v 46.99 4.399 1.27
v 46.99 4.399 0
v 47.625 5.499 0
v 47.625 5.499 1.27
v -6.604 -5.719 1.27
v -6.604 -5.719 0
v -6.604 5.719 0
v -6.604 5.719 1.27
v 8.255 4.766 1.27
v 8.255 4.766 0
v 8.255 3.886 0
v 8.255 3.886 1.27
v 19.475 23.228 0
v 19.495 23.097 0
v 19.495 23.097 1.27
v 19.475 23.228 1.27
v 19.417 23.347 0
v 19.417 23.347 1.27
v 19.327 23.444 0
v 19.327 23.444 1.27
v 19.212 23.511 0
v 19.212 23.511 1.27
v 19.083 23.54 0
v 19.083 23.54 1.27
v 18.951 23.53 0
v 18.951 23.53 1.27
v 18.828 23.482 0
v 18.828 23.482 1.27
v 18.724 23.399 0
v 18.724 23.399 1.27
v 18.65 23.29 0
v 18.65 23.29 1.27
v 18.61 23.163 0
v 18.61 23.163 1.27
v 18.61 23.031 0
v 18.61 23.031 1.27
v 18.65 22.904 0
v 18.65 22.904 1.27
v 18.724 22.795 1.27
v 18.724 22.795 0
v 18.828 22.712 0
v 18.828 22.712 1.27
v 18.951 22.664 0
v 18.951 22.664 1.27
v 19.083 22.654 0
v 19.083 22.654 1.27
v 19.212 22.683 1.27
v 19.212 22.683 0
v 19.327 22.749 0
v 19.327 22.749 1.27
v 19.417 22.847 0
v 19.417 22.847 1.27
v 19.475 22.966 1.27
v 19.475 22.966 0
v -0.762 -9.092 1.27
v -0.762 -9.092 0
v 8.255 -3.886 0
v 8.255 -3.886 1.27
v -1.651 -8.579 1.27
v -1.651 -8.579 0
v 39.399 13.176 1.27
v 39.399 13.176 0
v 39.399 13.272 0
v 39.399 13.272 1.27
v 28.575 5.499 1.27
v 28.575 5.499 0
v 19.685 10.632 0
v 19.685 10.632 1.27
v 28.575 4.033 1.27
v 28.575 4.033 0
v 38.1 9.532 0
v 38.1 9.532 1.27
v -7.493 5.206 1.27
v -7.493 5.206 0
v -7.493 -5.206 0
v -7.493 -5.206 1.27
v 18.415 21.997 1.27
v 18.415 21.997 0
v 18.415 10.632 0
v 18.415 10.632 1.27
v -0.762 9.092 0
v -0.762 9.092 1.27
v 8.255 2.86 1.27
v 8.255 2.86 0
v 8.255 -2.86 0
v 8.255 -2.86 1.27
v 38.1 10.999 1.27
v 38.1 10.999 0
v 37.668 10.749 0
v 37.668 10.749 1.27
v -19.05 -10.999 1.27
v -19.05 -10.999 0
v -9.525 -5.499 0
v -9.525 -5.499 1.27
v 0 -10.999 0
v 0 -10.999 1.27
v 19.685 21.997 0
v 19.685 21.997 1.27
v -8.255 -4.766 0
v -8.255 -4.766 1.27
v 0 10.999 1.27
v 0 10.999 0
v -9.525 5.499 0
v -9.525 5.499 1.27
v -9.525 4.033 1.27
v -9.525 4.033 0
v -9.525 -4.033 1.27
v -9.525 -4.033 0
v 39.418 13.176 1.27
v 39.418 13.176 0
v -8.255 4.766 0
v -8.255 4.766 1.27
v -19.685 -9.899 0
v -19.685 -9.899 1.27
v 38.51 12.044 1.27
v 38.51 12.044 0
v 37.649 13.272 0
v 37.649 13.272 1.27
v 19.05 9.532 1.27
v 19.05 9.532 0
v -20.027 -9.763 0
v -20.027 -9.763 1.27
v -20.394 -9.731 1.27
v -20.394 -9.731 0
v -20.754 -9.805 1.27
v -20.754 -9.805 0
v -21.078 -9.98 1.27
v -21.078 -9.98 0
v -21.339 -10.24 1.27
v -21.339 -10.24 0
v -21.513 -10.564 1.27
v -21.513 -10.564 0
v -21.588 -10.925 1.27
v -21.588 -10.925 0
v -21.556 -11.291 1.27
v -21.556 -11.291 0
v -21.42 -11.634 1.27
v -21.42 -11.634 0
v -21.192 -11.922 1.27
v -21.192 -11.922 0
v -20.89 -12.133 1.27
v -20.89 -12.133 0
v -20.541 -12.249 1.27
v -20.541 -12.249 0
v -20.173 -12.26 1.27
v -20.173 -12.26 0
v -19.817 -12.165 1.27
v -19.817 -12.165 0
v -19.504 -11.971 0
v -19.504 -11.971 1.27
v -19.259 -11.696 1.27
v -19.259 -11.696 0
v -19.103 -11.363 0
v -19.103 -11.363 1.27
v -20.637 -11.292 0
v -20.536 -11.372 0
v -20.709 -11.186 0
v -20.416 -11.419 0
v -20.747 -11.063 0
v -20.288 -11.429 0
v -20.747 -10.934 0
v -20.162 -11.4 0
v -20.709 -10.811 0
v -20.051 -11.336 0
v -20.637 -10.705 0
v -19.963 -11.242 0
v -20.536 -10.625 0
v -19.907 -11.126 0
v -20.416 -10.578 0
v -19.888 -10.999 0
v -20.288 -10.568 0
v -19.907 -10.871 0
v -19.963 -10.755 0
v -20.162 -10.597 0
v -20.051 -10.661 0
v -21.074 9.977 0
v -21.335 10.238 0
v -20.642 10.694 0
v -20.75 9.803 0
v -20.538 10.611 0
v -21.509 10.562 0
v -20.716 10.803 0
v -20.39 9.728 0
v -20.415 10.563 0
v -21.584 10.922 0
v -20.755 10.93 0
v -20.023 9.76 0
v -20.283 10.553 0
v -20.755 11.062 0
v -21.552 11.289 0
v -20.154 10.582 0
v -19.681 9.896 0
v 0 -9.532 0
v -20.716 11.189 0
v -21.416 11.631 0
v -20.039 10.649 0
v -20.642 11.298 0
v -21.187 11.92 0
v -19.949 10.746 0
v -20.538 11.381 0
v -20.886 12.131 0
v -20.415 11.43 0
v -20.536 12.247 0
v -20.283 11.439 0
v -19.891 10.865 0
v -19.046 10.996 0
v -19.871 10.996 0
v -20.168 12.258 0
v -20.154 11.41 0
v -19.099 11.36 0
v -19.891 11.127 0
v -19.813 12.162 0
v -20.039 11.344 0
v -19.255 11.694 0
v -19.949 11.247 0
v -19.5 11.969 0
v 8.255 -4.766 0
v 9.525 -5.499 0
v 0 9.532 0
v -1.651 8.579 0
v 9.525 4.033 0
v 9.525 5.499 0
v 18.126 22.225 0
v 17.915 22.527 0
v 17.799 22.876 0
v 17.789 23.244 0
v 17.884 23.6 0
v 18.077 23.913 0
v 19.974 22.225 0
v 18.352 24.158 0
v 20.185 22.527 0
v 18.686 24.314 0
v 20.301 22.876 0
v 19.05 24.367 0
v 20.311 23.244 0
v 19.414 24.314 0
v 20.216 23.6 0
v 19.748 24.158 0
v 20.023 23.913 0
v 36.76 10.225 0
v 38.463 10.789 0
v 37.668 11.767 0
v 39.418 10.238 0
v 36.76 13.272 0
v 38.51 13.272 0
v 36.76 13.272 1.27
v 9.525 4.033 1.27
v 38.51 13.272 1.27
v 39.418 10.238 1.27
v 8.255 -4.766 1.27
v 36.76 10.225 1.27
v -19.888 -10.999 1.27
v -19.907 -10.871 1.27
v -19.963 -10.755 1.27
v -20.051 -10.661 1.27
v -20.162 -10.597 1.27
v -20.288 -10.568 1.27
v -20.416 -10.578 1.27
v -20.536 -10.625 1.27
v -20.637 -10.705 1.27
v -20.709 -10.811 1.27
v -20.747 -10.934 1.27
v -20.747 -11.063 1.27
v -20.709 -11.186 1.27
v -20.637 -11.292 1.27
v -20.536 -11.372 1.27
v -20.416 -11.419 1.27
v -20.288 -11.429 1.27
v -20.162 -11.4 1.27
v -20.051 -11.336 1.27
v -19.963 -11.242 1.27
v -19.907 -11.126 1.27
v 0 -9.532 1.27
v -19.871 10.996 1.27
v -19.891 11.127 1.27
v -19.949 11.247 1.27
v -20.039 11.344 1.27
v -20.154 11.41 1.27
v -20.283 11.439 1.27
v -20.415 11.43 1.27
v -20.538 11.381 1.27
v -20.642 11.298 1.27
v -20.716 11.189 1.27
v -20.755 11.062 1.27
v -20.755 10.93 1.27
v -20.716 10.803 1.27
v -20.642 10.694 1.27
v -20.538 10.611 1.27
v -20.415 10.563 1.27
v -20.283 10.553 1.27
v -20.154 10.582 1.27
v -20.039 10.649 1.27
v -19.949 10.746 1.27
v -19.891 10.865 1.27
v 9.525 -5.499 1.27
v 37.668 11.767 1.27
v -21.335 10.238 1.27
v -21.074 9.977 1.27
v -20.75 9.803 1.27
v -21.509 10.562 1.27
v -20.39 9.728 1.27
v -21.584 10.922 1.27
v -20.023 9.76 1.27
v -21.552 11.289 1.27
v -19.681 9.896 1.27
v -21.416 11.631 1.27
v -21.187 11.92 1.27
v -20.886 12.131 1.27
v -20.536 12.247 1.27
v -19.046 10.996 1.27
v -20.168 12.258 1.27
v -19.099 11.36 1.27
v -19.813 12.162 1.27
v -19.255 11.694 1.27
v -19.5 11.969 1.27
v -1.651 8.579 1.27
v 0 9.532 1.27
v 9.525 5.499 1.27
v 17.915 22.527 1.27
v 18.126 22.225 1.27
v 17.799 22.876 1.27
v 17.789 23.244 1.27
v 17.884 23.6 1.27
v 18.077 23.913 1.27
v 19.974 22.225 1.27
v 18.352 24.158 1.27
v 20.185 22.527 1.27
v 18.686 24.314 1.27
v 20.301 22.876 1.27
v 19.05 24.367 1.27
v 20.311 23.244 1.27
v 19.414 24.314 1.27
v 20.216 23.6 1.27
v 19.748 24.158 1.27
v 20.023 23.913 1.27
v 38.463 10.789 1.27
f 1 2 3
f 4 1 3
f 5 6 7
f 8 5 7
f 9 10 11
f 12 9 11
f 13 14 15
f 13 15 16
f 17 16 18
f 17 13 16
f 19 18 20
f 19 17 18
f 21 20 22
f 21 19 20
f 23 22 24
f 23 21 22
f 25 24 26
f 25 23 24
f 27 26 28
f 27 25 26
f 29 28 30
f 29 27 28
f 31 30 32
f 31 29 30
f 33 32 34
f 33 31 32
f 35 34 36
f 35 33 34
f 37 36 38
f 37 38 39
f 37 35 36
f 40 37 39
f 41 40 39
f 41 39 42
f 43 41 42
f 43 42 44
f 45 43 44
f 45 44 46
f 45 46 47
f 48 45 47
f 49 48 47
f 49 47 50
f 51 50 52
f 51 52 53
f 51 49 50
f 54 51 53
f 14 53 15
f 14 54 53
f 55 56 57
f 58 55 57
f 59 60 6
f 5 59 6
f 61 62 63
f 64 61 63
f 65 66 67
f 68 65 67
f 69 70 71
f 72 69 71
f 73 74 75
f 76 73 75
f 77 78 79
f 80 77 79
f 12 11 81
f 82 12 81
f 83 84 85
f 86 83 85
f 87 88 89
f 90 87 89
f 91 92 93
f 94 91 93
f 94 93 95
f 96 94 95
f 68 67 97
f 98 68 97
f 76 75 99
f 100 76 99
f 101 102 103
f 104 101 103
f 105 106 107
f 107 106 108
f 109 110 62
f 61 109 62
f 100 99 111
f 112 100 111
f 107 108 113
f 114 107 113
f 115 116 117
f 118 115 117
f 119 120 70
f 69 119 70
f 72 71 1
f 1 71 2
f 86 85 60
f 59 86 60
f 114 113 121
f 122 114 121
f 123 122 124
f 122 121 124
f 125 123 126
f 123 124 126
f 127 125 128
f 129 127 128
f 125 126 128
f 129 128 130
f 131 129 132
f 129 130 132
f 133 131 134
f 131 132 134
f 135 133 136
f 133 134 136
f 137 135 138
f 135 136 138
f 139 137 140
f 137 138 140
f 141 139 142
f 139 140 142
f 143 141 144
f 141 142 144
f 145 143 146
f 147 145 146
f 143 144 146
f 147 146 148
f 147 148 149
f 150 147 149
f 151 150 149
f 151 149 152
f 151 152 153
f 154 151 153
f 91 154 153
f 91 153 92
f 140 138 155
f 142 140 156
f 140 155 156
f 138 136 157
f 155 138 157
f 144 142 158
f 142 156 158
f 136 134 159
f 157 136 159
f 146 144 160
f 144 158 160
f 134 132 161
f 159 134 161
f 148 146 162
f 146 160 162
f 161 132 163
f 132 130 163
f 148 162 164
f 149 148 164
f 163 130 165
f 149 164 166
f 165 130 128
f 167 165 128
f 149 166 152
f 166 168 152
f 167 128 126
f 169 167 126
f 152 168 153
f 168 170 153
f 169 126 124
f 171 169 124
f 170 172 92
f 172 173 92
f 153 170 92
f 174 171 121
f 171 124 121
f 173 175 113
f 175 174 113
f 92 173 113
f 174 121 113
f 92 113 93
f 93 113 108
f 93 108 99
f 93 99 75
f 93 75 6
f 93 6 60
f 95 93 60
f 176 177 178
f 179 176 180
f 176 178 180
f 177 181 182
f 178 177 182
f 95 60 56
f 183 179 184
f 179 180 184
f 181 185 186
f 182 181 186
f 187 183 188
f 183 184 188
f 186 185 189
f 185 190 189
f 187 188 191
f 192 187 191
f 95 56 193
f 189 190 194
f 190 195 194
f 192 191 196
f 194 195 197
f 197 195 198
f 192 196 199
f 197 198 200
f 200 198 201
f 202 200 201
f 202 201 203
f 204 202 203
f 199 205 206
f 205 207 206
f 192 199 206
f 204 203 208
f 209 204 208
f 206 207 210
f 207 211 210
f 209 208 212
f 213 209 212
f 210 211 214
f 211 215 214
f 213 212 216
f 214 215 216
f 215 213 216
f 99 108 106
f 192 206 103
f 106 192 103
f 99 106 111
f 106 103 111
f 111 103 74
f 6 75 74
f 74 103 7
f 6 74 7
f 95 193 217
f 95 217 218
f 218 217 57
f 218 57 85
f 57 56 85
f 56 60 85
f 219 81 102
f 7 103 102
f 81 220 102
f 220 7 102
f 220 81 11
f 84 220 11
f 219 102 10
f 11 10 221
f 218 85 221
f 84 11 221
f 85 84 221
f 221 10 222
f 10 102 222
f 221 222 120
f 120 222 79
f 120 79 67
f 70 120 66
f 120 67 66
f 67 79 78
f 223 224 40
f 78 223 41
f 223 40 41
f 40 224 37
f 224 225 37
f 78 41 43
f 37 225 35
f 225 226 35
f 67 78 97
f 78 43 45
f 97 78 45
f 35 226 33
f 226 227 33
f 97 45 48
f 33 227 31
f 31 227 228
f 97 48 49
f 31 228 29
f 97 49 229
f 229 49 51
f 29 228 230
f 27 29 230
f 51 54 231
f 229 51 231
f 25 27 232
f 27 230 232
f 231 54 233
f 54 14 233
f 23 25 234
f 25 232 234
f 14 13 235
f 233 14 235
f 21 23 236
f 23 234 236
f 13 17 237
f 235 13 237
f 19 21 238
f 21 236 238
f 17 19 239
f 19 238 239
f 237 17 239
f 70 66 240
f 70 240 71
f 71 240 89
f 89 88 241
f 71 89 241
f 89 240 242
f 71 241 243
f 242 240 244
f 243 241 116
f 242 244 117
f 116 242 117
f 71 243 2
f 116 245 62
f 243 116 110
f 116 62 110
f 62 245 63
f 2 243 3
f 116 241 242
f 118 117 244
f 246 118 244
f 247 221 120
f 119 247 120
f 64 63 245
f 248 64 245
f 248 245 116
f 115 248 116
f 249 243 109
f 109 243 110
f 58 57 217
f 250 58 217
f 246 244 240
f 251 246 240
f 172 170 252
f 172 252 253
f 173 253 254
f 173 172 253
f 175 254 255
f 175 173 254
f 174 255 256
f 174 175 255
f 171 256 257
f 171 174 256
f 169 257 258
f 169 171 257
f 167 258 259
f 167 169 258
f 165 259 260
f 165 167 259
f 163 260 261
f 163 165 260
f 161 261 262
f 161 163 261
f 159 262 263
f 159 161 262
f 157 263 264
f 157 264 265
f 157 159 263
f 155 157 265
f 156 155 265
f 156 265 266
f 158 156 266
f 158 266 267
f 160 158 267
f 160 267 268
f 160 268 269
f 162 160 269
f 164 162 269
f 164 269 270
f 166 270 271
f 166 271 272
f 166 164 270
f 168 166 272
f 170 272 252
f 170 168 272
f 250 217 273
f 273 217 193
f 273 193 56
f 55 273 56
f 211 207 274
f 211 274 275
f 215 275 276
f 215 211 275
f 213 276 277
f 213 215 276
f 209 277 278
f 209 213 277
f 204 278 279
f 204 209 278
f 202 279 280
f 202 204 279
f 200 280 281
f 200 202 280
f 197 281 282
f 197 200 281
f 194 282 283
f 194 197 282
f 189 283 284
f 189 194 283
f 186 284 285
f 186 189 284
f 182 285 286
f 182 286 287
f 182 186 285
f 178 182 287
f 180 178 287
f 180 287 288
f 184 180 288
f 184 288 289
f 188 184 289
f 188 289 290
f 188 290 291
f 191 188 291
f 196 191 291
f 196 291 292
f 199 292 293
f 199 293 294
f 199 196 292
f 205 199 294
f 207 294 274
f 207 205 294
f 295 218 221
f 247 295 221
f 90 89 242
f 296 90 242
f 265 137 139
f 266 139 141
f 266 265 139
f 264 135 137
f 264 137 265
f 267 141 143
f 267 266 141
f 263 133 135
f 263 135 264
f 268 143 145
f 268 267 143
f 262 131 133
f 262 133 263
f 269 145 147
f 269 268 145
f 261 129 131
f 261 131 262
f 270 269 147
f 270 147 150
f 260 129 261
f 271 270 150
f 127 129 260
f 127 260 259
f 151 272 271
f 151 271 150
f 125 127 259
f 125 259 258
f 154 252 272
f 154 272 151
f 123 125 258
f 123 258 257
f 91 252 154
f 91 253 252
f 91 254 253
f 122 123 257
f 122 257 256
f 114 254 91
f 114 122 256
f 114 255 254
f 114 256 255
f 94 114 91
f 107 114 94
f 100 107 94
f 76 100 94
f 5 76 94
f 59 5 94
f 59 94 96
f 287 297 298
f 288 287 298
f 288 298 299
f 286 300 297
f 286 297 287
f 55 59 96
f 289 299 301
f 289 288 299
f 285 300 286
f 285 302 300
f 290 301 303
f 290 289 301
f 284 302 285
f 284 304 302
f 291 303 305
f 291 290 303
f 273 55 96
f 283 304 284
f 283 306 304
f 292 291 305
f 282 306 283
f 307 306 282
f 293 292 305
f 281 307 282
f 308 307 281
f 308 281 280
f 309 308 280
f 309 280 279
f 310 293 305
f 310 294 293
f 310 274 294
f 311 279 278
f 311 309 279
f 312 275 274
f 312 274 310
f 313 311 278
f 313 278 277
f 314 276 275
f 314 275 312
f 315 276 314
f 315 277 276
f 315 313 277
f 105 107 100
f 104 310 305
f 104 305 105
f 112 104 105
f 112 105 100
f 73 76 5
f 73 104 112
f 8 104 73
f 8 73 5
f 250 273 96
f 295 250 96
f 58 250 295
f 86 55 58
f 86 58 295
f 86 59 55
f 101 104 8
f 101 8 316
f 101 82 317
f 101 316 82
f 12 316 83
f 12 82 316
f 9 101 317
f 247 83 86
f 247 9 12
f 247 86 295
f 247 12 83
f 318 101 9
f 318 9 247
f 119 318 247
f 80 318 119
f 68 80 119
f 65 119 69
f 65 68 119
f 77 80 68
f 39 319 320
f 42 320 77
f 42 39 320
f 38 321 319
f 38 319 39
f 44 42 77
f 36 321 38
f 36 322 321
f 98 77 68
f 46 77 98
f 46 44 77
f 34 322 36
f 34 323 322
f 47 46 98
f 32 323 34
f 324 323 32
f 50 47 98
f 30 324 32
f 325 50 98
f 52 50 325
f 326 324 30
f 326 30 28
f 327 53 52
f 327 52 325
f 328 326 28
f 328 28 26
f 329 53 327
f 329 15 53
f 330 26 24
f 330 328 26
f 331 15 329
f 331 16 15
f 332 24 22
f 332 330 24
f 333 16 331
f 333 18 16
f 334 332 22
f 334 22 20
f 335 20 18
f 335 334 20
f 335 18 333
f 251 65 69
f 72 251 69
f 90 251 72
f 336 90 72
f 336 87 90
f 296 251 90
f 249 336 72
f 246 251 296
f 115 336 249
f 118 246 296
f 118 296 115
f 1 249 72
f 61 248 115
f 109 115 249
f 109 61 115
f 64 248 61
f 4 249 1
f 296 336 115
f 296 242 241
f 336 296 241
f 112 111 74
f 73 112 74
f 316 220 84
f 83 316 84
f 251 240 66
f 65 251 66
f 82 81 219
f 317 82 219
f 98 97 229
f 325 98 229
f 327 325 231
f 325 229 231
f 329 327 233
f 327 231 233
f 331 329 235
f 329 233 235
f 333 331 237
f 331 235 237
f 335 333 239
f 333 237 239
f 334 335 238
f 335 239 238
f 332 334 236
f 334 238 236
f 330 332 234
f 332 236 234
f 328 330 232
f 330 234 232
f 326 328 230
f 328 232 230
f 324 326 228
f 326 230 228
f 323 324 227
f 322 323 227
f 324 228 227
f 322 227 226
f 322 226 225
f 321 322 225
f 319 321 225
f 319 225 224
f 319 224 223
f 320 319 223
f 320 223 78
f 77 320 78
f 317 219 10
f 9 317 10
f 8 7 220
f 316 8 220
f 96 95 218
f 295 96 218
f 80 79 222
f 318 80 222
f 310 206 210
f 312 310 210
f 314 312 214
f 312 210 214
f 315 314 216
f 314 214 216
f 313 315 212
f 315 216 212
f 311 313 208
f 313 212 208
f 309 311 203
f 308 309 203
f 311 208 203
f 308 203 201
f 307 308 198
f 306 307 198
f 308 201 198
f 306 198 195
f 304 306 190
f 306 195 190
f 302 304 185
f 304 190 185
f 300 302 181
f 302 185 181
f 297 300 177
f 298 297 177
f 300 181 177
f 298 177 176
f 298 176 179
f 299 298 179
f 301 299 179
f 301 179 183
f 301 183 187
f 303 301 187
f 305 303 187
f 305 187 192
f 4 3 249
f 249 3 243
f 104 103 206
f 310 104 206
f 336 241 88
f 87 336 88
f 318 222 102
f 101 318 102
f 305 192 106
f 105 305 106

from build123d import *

# Parameters (mm, degrees)
F0_R     = 0.4318
F0_R_2   = 0.4445
F1_DEPTH = 1.27
F3_DEPTH = 1.27


# Not quite as in the source:
# - ends of sketch curves that miss each other by under 0.0002 mm in the source are joined


with BuildPart() as f1:
    # F0 (on Top) → F1 (new body)
    with BuildSketch(Plane.XY):
        with BuildLine():
            Line((9.5249989071, 5.499263207), (-2.1858e-06, 10.9985226281))
            Line((-2.1858e-06, 10.9985226281), (-9.5250010929, 5.499259421))
            Line((-9.5250010929, 5.499259421), (-19.0459112442, 10.9961569369))
            ThreePointArc((-19.0459112442, 10.9961569369), (-21.4157534444, 11.6311591353), (-19.6809068475, 9.8963021357))
            Line((-19.6809068475, 9.8963021357), (-9.5250008015, 4.0327897373))
            Line((-9.5250008015, 4.0327897373), (-9.5249991985, -4.0327941963))
            Line((-9.5249991985, -4.0327941963), (-19.6850080876, -9.8986699867))
            ThreePointArc((-19.6850080876, -9.8986699867), (-21.4198613847, -11.6335212151), (-19.0500087433, -10.9985226281))
            Line((-19.0500087433, -10.9985226281), (-9.5249989071, -5.499263207))
            Line((-9.5249989071, -5.499263207), (2.1858e-06, -10.9985226281))
            Line((2.1858e-06, -10.9985226281), (9.5250010929, -5.499259421))
            Line((9.5250010929, -5.499259421), (9.5249991985, 4.0327941963))
            Line((9.5249991985, 4.0327941963), (19.0500087433, 9.5320534491))
            Line((19.0500087433, 9.5320534491), (28.5750185796, 4.0327940281))
            Line((28.5750185796, 4.0327940281), (38.1000284158, 9.5320534491))
            Line((38.1000284158, 9.5320534491), (46.9900389078, 4.3994105656))
            Line((46.9900389078, 4.3994105656), (47.625038252, 5.499263207))
            Line((47.625038252, 5.499263207), (39.3991596309, 10.2484699041))
            Line((39.3991596309, 10.2484699041), (39.3991596309, 10.224751758))
            Line((39.3991596309, 10.224751758), (38.673771624, 10.6672722885))
            Line((38.673771624, 10.6672722885), (38.1000284158, 10.9985226281))
            Line((38.1000284158, 10.9985226281), (37.6488161101, 10.7380154406))
            Line((37.6488161101, 10.7380154406), (37.6488161101, 10.731614756))
            Line((37.6488161101, 10.731614756), (36.7598161101, 10.224751758))
            Line((36.7598161101, 10.224751758), (28.5750185796, 5.499263207))
            Line((28.5750185796, 5.499263207), (19.6850087433, 10.6319053096))
            Line((19.6850087433, 10.6319053096), (19.6850087433, 10.9985226281))
            Line((19.6850087433, 10.9985226281), (19.6850087433, 21.9970528281))
            ThreePointArc((19.6850087433, 21.9970528281), (19.0500083949, 24.3669048897), (18.4150080465, 21.9970528281))
            Line((18.4150080465, 21.9970528281), (18.4150080465, 10.9985226281))
            Line((18.4150080465, 10.9985226281), (18.4150080465, 10.6319053096))
            Line((18.4150080465, 10.6319053096), (9.5249989071, 5.499263207))
        make_face()
        with Locations((-20.3200087433, -10.9985218709)):
            Circle(F0_R, mode=Mode.SUBTRACT)
        Polygon((8.2550007723, -3.8861430213), (8.2550009472, -4.7660248316), (1.8944e-06, -9.5320529443), (-0.761998193, -9.0921121906), align=None, mode=Mode.SUBTRACT)
        Polygon((-8.255, -1.6406e-06), (-8.2550009472, 4.7660248316), (-7.493, 5.2059664855), (-7.493, -1.6406e-06), (-7.493, -5.2059682691), (-8.2549990528, -4.7660281127), align=None, mode=Mode.SUBTRACT)
        Polygon((-6.604, -5.499263207), (-6.604, 5.7192311104), (-1.6510017049, 8.5788473218), (8.2549994317, 2.8596175239), (8.2550005683, -2.8596142427), (-1.6509982951, -8.578847978), (-6.604, -5.7192324228), align=None, mode=Mode.SUBTRACT)
        with Locations((-20.3159024508, 10.9961569369)):
            Circle(F0_R_2, mode=Mode.SUBTRACT)
        Polygon((-1.8944e-06, 9.5320529443), (8.2549990528, 4.7660281127), (8.2549992277, 3.8861463025), (-0.762001807, 9.0921118878), align=None, mode=Mode.SUBTRACT)
        with Locations((19.0500083949, 23.0969048897)):
            Circle(F0_R_2, mode=Mode.SUBTRACT)
        Polygon((36.7598161101, 10.731614756), (36.7598161101, 10.224751758), (37.6488161101, 10.7380154406), (37.6488161101, 11.8624546668), (38.5683002365, 10.731614756), (38.673771624, 10.6672722885), (39.3991596309, 10.2484699041), (39.3991596309, 10.731614756), (39.3991596309, 13.271614756), (38.5101596309, 13.271614756), (38.5101596309, 12.0436610678), (37.6488161101, 13.271614756), (36.7598161101, 13.271614756), align=None)
        Polygon((37.6488161101, 10.7380154406), (36.7598161101, 10.224751758), (37.6488161101, 10.731614756), align=None)
        Polygon((39.3991596309, 10.2484699041), (38.673771624, 10.6672722885), (39.3991596309, 10.224751758), align=None)
    extrude(amount=F1_DEPTH)

    # F2 (on Top) → F3 (join)
    with BuildSketch(Plane.XY):
        Polygon((37.6677321614, 13.1759580532), (36.7787321614, 13.1759580532), (36.7787321614, 10.6359580532), (36.7787321614, 10.1290950552), (37.6677321614, 10.6359580532), (37.6677321614, 11.7667979639), (38.5872162879, 10.6359580532), (39.4180756822, 10.1290950552), (39.4180756822, 10.6359580532), (39.4180756822, 13.1759580532), (38.5290756822, 13.1759580532), (38.5290756822, 11.948004365), align=None)
    extrude(amount=F3_DEPTH)


solid = f1.part
